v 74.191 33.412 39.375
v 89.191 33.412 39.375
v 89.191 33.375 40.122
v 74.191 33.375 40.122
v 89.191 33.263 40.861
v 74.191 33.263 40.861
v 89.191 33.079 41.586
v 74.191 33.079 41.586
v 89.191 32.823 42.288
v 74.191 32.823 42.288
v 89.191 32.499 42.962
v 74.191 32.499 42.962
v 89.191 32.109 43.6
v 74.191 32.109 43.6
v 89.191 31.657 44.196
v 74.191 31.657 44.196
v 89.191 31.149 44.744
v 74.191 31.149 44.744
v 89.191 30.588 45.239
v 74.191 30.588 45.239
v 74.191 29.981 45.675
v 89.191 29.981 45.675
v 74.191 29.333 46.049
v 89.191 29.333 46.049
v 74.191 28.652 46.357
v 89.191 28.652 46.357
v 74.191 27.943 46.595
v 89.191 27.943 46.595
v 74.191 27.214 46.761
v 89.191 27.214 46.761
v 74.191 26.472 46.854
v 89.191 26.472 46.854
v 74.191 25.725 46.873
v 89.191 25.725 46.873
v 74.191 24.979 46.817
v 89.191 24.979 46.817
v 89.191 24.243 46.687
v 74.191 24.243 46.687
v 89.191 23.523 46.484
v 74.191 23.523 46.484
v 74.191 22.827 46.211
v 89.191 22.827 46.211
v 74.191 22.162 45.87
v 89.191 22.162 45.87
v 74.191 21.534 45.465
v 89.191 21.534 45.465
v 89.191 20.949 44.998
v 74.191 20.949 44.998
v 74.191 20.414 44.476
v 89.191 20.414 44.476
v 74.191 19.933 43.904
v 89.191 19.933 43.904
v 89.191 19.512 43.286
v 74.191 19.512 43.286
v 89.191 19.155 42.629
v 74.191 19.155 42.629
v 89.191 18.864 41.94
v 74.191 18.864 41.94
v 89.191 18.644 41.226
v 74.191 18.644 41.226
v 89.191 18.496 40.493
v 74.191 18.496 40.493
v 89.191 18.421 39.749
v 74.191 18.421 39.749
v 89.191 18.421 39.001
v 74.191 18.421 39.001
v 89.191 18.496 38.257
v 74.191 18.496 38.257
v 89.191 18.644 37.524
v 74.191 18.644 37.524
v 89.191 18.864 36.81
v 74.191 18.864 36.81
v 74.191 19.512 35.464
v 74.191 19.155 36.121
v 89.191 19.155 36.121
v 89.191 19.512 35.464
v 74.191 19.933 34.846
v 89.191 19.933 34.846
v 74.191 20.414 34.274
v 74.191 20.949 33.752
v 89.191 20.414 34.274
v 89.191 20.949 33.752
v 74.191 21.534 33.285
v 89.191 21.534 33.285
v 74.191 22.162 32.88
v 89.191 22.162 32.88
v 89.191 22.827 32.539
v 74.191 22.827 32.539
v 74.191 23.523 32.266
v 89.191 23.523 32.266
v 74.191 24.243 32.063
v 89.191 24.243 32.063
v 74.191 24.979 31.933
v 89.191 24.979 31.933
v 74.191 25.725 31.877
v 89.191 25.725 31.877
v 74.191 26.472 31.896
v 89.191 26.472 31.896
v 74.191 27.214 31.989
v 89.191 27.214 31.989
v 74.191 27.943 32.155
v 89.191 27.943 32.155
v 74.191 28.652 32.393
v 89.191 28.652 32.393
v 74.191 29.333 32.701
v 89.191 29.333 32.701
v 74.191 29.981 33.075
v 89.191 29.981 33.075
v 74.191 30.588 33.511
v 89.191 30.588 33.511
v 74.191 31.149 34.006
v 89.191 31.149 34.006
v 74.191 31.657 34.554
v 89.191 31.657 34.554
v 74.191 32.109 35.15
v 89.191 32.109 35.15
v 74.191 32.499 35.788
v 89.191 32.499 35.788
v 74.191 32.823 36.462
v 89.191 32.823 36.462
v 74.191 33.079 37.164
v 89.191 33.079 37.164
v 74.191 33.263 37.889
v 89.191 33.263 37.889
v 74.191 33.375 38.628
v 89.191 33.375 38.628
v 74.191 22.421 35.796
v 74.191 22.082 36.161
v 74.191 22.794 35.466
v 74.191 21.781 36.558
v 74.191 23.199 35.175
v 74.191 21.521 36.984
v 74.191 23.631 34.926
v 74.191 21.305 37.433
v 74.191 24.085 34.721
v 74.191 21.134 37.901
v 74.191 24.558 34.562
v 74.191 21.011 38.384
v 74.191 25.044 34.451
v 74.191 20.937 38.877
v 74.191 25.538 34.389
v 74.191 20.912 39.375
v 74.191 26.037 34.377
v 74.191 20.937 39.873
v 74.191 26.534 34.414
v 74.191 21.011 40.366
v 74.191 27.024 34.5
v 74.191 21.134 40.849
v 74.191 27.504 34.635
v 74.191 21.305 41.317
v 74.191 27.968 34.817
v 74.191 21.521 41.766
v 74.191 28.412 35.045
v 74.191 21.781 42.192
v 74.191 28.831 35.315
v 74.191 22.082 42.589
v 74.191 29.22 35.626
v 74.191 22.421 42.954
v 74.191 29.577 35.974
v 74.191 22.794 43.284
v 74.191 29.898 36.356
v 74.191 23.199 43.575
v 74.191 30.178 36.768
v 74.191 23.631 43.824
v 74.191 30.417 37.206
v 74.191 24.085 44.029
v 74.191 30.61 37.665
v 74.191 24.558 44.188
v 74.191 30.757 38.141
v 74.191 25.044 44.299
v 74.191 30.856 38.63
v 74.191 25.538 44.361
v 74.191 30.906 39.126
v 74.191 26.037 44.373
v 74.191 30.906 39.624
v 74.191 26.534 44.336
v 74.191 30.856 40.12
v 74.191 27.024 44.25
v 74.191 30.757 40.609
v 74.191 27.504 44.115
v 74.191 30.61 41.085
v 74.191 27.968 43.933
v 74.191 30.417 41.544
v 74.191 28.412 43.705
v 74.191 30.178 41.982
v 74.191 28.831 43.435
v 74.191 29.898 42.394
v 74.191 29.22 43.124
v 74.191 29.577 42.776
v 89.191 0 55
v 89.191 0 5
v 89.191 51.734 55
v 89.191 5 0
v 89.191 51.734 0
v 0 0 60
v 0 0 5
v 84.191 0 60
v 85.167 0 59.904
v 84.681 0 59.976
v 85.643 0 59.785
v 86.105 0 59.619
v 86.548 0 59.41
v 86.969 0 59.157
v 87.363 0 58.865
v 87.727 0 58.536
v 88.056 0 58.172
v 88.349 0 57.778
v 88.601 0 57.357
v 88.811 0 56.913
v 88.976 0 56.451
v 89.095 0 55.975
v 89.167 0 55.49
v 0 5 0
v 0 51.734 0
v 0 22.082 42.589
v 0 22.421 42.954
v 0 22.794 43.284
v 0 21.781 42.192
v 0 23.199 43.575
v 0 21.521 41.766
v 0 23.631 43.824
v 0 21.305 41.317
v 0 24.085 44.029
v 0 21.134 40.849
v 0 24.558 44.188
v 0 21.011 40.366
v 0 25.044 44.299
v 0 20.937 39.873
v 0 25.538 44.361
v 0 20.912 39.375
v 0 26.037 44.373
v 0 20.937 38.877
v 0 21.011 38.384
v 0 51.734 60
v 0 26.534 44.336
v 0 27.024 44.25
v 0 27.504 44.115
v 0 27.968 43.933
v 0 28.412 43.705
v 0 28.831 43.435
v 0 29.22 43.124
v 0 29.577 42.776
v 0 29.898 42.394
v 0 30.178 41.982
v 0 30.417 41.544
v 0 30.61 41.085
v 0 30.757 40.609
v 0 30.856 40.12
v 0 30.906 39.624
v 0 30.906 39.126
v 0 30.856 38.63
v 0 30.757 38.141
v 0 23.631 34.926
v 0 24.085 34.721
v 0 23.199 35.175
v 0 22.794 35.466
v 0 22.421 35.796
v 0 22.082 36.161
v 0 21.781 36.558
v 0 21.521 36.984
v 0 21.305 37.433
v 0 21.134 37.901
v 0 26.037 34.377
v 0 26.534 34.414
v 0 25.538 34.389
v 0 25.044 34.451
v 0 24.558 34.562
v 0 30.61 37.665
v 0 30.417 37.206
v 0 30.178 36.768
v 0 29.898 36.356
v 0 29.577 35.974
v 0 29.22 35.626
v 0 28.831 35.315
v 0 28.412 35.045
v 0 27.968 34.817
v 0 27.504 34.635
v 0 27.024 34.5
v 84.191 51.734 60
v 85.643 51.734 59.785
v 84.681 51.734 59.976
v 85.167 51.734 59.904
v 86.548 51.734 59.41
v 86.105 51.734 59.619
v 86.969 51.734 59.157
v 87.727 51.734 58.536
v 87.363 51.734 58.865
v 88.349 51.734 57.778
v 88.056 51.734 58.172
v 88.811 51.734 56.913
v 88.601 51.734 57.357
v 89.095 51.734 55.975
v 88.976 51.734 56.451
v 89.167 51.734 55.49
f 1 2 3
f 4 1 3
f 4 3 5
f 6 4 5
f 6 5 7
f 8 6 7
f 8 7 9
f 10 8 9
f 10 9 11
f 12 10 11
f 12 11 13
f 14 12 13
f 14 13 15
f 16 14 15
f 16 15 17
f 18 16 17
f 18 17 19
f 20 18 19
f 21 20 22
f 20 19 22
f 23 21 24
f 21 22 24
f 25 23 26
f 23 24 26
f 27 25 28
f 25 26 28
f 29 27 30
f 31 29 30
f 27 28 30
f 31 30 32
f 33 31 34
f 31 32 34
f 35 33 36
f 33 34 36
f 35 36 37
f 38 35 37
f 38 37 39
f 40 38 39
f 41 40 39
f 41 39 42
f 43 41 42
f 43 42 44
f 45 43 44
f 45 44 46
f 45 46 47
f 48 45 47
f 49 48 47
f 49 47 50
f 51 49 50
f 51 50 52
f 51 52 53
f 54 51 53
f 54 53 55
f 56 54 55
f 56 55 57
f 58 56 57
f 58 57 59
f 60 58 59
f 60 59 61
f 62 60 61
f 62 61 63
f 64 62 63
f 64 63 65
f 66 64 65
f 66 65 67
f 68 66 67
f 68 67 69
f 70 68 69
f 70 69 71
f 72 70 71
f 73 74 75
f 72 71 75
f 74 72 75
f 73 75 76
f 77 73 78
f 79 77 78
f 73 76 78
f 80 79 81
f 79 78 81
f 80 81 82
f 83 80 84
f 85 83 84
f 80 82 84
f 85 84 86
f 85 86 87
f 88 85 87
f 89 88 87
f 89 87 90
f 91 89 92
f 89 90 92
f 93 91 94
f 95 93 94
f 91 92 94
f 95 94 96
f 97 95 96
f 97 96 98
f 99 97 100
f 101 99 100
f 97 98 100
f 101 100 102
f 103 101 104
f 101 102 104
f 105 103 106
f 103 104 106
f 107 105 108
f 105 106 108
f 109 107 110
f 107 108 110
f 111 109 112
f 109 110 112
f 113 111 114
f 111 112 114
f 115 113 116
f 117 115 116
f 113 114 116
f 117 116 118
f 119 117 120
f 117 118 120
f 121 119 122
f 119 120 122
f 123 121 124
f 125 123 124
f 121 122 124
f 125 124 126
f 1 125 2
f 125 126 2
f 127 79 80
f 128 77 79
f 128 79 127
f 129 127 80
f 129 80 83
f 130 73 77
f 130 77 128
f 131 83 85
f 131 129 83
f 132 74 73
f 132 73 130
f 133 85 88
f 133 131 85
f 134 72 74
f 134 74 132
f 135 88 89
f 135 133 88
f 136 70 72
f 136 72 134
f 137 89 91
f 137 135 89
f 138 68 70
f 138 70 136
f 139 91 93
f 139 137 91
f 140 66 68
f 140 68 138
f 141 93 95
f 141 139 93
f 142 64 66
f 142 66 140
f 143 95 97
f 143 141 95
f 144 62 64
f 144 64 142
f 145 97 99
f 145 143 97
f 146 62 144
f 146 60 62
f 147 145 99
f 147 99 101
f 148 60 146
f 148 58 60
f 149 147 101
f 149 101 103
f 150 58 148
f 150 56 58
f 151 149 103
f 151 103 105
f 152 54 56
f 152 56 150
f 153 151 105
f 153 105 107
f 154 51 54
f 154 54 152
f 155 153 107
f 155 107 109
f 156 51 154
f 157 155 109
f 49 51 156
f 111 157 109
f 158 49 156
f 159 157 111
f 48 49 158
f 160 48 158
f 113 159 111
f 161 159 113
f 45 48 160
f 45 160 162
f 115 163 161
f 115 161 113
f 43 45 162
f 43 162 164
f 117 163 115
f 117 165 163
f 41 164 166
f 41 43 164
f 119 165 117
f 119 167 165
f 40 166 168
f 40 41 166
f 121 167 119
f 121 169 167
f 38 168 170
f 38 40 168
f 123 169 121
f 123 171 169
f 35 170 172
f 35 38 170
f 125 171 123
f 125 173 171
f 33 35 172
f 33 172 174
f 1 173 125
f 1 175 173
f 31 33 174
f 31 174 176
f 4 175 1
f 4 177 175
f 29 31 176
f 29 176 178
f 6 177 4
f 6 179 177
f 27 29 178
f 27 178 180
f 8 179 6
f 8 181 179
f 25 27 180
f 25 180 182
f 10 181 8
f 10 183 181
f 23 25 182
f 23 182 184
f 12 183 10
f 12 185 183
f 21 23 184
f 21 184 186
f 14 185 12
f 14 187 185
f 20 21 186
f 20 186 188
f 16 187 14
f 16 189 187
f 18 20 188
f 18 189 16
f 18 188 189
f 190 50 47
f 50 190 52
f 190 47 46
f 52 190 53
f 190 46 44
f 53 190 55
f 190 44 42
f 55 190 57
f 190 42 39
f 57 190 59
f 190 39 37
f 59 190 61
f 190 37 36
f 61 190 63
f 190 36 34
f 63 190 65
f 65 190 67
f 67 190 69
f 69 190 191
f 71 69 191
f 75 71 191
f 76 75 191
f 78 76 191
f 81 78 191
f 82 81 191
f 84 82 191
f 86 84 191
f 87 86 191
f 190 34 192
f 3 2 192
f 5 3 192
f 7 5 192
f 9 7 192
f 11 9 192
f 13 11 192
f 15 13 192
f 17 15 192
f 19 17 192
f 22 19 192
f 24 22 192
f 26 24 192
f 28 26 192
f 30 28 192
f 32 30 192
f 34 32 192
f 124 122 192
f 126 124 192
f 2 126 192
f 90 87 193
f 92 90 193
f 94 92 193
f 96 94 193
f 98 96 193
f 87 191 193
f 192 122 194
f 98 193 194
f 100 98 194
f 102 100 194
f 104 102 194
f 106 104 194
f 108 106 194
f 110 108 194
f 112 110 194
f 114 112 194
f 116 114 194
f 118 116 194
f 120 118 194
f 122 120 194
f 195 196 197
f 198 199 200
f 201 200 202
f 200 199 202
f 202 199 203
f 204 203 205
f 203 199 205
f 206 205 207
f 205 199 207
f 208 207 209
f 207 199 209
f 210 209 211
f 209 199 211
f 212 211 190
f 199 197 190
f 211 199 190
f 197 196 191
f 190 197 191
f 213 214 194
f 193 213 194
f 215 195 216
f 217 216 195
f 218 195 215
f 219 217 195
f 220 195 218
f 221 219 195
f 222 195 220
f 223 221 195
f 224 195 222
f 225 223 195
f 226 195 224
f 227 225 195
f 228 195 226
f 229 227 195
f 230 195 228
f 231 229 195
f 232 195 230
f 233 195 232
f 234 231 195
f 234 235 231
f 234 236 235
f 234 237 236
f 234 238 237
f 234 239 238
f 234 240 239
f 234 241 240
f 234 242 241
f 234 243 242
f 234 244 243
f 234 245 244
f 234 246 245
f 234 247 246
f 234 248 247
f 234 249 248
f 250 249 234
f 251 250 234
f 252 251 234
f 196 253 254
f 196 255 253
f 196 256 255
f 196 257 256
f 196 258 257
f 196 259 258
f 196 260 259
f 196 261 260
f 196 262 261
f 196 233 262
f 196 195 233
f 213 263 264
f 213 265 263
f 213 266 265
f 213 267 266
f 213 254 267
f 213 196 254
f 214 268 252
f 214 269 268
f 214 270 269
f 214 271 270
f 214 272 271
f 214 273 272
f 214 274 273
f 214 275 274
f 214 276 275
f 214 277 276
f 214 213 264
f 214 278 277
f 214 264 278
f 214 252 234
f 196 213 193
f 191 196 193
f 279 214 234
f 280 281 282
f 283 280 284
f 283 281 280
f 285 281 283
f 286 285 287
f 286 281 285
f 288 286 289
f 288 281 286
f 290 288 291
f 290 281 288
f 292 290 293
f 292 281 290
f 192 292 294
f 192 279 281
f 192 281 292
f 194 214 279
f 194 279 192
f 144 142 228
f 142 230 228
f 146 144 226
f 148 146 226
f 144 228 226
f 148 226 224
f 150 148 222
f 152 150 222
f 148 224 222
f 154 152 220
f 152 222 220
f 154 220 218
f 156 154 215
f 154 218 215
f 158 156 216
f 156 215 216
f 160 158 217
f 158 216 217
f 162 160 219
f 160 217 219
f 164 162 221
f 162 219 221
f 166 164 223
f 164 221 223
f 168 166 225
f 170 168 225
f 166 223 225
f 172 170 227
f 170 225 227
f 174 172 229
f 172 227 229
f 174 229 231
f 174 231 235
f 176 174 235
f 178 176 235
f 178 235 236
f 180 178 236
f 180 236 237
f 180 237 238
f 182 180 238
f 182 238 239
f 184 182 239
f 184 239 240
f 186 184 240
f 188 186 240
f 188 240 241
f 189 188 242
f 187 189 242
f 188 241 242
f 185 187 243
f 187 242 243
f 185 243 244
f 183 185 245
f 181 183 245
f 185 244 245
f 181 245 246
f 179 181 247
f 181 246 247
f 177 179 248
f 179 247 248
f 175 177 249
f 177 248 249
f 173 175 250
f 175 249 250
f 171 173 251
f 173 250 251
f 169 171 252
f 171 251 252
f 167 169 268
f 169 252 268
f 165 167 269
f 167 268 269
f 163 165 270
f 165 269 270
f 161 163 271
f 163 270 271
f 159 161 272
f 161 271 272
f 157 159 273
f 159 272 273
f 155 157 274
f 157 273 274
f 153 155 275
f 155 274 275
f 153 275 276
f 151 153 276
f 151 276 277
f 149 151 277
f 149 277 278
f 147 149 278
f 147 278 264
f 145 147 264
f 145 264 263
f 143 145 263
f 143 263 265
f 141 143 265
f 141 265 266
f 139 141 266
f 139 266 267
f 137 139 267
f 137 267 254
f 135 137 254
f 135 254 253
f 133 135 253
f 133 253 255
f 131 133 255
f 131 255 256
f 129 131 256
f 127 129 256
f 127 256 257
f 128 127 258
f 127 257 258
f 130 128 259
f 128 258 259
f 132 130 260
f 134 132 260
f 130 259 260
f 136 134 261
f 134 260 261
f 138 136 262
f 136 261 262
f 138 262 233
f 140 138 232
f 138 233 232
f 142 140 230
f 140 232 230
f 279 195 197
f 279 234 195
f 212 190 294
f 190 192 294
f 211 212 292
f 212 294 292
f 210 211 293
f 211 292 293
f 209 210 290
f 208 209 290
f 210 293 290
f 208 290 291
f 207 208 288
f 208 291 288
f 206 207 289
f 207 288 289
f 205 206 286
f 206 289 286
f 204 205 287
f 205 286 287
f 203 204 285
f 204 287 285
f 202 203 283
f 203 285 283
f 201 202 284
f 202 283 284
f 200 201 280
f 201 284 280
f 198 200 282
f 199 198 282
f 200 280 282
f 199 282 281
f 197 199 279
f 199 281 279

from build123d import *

# Parameters (mm, degrees)
F0_W           = 89.191195
F0_H           = 51.733698
F1_DEPTH       = 60
F2_R           = 5
F3_SIZE        = 5
F5_D           = 10
F5_CBORE_D     = 15
F5_CBORE_DEPTH = 15


with BuildPart() as f1:
    # F0 (on Top) → F1 (new body)
    with BuildSketch(Plane.XY):
        with Locations((44.595597, 25.866849)):
            Rectangle(F0_W, F0_H)
    extrude(amount=F1_DEPTH)

    # F2
    f2_edges = [f1.edges().sort_by_distance(p)[0] for p in [
        (89.191195, 25.866849, 60),
    ]]
    fillet(f2_edges, radius=F2_R)

    # F3
    f3_edges = [f1.edges().sort_by_distance(p)[0] for p in [
        (44.595597, 0, 0),
    ]]
    chamfer(f3_edges, length=F3_SIZE)

    # F5 (through all)
    with Locations(Plane.YZ.offset(89.191195)):
        with Locations((25.911886, 39.375003)):
            CounterBoreHole(F5_D / 2, F5_CBORE_D / 2, F5_CBORE_DEPTH)


solid = f1.part
